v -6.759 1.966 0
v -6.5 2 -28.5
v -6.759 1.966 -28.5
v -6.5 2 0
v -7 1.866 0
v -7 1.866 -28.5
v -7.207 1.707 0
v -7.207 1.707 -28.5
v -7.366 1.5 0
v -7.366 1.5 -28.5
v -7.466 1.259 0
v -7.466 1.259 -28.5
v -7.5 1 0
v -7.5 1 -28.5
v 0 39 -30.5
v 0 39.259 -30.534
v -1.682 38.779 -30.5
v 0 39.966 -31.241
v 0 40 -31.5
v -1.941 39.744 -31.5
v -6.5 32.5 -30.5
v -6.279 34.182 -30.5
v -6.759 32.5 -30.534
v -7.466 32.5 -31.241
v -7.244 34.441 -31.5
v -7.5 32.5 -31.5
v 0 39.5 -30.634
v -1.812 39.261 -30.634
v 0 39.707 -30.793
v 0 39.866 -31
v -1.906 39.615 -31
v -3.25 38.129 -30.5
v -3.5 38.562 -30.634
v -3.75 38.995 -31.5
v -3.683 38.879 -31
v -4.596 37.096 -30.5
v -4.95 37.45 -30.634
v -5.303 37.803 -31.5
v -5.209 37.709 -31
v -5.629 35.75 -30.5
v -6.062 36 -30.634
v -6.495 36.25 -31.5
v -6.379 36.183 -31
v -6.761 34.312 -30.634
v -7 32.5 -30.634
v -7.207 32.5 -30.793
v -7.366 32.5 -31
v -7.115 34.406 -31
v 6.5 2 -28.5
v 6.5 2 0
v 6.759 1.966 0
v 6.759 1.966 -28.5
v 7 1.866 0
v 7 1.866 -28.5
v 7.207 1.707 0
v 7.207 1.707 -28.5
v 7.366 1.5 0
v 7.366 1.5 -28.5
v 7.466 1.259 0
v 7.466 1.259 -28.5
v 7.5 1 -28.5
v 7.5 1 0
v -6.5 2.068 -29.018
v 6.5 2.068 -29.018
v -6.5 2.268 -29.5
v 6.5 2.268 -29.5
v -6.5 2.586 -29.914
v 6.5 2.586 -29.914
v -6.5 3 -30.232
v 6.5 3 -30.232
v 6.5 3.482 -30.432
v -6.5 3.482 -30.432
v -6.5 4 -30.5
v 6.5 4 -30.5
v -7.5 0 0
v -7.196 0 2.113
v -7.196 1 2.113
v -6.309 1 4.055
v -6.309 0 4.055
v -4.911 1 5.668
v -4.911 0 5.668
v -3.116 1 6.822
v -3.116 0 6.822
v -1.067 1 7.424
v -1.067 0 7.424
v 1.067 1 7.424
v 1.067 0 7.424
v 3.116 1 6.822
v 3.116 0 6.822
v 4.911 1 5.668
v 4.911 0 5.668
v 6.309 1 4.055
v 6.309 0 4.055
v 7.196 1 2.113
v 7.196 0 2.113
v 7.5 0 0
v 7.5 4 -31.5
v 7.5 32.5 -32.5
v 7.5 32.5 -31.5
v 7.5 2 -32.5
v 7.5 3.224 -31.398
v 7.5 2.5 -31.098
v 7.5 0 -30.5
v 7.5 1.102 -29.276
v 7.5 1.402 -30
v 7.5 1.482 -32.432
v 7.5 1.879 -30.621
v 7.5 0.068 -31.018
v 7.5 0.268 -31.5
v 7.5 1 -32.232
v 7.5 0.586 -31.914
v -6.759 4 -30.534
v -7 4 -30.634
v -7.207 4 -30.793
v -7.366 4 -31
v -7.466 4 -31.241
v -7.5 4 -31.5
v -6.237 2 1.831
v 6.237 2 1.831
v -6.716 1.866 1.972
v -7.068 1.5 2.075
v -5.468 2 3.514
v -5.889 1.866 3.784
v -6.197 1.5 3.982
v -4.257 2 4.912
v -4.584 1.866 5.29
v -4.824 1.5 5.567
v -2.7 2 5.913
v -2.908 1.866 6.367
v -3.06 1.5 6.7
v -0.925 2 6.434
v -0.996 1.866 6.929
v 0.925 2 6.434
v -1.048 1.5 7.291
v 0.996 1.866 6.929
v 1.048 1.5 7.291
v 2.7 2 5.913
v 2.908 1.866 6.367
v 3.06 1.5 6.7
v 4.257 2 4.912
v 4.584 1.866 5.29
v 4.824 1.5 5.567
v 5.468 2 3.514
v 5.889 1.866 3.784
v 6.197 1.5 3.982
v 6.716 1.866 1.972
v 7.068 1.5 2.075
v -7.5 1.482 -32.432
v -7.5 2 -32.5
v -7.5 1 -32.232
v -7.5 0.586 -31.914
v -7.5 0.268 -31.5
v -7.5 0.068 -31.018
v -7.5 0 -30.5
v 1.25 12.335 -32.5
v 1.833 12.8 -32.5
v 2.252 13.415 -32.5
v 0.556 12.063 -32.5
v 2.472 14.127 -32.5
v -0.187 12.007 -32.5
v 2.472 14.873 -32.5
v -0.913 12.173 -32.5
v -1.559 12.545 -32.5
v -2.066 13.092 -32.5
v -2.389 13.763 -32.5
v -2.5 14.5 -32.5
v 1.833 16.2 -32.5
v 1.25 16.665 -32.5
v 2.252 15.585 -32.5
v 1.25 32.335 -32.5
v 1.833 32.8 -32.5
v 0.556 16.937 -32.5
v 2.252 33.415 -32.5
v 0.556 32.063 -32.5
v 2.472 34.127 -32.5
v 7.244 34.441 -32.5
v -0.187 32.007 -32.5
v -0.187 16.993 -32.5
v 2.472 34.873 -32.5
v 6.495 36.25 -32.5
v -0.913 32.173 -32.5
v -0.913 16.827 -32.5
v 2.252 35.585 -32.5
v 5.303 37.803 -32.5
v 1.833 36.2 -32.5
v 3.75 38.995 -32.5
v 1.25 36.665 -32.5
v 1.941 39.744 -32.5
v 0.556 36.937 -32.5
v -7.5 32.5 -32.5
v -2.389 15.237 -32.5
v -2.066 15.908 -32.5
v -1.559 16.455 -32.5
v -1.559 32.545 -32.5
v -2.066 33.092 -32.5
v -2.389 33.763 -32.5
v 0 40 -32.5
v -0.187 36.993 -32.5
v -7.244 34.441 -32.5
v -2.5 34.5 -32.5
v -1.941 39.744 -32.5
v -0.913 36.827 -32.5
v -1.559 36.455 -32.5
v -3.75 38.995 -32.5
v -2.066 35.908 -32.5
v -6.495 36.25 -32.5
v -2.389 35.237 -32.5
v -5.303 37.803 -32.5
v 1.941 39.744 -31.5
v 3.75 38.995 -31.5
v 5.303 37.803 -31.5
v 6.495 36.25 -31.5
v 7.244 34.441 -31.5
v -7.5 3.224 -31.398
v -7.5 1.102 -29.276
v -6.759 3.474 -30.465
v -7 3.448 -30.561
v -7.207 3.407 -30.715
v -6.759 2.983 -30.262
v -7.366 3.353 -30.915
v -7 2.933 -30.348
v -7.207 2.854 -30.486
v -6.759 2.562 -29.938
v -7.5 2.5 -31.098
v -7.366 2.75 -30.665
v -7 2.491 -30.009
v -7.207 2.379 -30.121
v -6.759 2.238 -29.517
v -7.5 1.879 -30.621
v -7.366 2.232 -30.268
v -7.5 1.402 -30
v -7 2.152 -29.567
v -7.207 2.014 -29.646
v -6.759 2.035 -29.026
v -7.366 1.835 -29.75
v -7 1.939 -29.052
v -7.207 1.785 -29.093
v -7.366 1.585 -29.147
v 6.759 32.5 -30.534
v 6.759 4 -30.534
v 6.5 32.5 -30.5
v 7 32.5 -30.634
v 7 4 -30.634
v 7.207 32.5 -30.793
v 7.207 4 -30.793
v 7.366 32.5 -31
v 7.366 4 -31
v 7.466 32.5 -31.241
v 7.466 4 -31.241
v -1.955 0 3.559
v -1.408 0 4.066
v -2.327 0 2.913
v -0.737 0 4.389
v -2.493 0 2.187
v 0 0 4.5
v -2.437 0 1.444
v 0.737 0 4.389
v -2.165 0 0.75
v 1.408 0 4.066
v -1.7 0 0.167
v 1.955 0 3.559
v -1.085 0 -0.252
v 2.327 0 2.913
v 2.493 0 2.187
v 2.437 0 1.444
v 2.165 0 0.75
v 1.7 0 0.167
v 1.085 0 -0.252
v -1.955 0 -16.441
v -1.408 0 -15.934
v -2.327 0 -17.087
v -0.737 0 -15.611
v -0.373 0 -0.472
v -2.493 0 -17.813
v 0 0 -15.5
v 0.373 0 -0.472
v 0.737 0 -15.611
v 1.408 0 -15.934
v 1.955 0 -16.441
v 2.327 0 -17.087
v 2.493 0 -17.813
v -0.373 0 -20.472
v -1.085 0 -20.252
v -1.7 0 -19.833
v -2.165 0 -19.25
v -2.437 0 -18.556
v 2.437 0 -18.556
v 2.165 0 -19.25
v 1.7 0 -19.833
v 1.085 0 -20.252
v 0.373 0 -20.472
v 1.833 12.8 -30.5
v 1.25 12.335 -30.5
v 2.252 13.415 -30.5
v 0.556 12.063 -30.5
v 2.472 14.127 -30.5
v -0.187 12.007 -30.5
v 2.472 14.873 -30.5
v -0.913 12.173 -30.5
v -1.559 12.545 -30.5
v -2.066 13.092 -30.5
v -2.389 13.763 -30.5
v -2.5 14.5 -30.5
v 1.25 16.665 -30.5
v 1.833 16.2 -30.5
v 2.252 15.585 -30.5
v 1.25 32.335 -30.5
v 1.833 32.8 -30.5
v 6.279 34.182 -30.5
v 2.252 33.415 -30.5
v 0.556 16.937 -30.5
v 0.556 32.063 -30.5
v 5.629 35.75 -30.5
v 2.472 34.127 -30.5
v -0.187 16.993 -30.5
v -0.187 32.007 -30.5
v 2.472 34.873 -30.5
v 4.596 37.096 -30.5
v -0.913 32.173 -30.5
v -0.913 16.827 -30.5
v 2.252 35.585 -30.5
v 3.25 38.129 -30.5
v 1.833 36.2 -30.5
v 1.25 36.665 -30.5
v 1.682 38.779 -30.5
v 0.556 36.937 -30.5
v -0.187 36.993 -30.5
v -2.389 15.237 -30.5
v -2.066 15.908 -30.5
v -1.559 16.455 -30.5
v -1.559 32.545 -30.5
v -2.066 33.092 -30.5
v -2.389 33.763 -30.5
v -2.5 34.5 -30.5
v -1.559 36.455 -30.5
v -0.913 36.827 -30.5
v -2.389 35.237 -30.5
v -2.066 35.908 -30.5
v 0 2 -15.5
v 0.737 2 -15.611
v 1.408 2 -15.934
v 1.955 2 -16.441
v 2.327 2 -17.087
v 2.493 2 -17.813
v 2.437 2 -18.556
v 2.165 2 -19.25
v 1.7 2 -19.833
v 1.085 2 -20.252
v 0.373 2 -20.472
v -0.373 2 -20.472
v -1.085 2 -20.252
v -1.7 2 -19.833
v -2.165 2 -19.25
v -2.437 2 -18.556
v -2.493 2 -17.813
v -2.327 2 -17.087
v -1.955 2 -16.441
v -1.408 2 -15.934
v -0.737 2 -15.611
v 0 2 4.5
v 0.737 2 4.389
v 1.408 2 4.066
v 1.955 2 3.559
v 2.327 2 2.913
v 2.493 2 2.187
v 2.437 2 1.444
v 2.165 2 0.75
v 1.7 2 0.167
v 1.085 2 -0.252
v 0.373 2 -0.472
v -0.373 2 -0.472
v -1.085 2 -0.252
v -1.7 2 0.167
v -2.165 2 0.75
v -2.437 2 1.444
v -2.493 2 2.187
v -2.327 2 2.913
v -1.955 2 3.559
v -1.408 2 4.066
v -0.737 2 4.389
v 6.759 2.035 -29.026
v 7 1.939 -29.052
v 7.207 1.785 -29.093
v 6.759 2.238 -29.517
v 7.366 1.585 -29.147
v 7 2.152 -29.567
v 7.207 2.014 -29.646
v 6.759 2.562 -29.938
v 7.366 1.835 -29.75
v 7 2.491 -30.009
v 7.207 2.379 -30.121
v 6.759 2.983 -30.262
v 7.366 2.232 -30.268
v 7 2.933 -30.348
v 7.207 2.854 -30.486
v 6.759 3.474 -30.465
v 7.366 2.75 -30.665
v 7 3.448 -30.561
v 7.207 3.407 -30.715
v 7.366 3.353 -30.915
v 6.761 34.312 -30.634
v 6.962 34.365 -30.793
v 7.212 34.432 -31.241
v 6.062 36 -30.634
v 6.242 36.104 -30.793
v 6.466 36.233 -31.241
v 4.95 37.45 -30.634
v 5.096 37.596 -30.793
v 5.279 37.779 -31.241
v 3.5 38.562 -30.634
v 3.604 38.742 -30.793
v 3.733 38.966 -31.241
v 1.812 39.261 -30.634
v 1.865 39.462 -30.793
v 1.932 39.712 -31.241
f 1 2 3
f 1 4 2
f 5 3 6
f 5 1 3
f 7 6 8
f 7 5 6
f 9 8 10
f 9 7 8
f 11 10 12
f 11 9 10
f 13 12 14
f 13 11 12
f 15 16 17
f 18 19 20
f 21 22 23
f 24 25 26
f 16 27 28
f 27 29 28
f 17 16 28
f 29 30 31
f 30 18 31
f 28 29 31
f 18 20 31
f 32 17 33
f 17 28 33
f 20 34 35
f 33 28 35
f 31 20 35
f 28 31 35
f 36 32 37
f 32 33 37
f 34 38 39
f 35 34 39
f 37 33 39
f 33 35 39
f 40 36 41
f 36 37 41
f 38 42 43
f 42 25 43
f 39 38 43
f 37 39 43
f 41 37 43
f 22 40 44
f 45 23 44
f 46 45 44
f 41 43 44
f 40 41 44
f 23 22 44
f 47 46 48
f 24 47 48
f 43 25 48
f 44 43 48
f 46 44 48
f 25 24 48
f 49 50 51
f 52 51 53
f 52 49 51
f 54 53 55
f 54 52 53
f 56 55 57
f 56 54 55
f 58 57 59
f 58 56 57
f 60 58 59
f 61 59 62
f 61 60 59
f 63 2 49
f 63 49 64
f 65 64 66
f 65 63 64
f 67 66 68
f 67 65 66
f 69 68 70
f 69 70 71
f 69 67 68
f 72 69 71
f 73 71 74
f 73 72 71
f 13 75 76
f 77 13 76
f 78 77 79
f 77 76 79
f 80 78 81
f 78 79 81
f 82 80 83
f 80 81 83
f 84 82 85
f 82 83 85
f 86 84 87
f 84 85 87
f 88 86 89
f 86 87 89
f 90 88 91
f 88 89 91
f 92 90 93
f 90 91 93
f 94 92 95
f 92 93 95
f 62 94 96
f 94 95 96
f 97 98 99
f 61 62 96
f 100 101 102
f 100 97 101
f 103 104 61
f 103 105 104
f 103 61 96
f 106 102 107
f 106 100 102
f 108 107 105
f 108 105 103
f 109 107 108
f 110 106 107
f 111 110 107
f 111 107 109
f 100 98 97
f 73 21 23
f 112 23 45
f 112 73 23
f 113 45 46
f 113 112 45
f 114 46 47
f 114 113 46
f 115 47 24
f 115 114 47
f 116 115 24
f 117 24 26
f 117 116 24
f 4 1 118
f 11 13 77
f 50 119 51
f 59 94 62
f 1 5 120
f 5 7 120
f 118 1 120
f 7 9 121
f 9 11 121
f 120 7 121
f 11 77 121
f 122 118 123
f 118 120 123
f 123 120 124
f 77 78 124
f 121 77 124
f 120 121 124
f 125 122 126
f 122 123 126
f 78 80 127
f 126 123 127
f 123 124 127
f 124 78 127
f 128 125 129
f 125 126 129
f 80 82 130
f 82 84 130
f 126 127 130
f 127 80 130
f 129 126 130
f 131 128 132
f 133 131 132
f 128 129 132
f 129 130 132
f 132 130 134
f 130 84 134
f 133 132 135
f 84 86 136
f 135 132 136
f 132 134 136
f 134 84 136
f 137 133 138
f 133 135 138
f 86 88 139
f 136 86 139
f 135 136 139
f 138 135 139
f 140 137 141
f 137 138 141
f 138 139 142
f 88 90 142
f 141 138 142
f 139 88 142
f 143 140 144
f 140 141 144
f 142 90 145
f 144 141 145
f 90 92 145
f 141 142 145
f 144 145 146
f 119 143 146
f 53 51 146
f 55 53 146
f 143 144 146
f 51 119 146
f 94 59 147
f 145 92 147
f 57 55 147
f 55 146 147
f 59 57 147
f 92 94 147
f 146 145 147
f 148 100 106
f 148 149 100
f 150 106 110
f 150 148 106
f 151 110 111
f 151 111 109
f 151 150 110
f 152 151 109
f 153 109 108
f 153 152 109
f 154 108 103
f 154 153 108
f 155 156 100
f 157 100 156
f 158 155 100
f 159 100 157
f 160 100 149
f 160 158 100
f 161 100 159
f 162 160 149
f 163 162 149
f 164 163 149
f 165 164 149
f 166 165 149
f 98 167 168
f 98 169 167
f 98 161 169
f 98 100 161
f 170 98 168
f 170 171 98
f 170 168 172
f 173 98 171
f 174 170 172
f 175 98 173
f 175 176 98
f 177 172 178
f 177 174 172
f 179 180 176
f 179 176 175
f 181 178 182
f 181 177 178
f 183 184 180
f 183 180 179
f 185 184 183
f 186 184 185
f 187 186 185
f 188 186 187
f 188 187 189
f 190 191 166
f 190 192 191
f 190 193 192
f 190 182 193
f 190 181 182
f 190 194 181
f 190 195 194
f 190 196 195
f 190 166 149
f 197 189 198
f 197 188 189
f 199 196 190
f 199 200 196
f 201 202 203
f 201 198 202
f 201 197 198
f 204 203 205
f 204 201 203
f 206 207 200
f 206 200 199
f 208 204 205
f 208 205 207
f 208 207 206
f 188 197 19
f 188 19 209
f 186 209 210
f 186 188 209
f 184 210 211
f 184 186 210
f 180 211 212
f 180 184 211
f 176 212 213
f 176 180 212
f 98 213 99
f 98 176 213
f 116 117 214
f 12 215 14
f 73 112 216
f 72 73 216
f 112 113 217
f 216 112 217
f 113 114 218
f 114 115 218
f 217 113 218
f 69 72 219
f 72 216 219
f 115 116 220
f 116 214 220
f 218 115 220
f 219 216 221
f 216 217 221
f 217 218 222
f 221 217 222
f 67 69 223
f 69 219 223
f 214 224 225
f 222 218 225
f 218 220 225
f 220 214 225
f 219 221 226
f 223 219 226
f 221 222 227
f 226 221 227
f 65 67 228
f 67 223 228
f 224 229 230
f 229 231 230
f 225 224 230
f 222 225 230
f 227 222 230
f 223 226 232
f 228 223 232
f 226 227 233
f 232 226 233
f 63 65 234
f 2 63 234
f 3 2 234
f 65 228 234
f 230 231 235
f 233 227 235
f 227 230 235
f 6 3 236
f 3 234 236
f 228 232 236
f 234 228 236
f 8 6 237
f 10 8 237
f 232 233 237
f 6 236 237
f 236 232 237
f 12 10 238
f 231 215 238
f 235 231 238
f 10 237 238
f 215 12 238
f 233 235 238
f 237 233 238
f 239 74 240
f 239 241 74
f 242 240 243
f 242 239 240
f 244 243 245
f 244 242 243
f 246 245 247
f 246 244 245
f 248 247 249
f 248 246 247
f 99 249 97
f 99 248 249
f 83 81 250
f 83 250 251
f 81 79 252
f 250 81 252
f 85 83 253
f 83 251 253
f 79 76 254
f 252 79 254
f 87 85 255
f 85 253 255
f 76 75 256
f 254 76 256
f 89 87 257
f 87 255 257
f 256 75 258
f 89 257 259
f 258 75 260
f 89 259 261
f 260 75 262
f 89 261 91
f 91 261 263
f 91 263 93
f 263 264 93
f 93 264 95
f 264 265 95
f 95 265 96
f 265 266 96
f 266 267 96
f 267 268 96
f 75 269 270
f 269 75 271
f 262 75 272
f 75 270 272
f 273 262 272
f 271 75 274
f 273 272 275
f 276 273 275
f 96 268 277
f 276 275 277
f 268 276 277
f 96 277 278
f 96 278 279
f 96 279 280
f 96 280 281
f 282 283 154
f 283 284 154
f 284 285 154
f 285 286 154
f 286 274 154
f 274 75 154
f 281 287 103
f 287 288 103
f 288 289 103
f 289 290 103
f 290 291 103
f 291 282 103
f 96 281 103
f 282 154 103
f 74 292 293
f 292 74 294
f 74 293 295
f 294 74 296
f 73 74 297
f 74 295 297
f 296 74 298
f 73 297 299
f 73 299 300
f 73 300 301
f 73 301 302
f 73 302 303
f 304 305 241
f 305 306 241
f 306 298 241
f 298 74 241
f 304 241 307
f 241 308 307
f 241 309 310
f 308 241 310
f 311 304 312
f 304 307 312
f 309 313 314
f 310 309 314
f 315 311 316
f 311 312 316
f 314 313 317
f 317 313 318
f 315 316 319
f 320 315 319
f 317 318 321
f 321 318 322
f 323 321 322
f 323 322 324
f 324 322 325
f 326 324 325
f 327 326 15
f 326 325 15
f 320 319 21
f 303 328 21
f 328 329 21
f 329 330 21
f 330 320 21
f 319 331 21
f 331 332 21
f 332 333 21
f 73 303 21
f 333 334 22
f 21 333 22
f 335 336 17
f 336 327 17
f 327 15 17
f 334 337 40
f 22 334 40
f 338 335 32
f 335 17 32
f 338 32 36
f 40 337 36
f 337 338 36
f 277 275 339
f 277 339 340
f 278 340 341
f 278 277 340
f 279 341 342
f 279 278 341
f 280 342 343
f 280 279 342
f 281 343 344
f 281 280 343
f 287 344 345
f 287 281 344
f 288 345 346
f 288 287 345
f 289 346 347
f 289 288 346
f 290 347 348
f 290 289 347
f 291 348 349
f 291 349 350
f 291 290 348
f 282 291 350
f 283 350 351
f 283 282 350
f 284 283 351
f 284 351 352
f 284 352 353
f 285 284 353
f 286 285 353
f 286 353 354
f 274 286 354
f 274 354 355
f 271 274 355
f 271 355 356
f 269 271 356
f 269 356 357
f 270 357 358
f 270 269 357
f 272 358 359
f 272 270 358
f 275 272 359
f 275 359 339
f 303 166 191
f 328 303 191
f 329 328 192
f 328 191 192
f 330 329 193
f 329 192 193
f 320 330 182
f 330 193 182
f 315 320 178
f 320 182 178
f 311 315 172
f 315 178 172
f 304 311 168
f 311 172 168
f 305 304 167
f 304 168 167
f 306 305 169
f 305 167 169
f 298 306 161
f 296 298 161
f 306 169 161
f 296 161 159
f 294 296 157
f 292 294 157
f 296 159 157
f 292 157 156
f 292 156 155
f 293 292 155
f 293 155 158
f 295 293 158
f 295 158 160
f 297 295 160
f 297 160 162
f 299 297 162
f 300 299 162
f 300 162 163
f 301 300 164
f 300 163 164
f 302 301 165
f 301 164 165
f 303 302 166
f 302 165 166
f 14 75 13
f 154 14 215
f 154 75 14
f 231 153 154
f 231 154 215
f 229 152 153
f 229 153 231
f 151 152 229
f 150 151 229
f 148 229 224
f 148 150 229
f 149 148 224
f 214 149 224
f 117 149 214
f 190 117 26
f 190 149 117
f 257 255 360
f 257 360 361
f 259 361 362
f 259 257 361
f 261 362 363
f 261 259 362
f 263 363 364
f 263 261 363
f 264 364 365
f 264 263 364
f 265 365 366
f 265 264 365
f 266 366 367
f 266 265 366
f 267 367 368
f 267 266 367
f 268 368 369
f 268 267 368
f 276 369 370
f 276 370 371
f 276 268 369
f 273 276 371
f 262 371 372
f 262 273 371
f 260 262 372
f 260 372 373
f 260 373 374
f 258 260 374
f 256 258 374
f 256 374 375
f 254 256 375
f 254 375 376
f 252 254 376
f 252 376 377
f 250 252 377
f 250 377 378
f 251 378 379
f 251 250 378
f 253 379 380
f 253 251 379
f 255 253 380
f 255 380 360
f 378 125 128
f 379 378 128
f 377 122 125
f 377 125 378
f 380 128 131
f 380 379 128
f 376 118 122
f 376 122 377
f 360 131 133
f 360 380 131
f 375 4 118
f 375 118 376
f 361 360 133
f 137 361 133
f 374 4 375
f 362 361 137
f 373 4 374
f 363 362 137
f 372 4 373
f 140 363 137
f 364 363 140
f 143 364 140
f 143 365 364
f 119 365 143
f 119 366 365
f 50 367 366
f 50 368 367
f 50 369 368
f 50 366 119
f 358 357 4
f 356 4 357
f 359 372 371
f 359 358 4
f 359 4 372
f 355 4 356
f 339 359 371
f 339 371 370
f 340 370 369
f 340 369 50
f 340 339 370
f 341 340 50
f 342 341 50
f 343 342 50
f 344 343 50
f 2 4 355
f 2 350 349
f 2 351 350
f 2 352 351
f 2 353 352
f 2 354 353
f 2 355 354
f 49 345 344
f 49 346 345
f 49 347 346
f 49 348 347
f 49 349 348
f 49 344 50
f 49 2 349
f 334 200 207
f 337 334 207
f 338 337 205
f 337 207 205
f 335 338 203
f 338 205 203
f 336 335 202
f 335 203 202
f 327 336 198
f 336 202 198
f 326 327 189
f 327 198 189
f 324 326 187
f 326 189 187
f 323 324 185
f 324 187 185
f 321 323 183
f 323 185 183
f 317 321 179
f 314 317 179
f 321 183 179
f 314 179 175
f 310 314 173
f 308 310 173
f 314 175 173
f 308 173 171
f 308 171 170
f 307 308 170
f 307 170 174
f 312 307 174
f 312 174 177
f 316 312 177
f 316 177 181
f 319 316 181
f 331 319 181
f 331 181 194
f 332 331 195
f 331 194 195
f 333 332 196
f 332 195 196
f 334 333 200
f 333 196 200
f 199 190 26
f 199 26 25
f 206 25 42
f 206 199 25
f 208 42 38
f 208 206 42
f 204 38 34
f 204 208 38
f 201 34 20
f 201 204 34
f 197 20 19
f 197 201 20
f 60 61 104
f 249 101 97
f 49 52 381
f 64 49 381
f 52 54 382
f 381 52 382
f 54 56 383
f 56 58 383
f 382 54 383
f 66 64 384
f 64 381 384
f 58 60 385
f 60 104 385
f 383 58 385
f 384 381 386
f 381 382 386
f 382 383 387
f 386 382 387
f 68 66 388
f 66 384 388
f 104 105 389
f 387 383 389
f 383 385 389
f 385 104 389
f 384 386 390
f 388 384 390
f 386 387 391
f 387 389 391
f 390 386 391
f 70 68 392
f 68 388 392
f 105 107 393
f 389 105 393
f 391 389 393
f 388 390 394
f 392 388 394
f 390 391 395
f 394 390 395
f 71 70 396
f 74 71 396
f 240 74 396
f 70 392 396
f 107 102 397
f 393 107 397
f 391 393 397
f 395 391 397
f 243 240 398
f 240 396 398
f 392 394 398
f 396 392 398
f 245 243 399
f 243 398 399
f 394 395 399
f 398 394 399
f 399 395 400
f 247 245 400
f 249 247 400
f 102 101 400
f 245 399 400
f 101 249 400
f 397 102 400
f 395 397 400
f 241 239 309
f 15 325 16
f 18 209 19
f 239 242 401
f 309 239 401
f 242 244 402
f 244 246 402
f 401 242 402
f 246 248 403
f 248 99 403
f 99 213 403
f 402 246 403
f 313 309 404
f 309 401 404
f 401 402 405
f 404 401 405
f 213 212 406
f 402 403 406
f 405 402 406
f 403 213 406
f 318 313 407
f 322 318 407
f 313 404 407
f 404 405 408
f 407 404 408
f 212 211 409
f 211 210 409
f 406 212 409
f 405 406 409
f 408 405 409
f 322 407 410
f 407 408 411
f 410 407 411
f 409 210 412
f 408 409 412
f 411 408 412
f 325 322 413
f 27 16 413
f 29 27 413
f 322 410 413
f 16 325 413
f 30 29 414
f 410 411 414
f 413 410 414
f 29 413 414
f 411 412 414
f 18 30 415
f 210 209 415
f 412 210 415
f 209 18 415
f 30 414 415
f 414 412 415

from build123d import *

# Parameters (mm, degrees)
ESQUISSE1_R        = 2.5
BOSS_EXTRU_2_DEPTH = 2
ESQUISSE2_R        = 2.5
ESQUISSE2_W        = 15
ESQUISSE2_H        = 2
BOSS_EXTRU_3_DEPTH = 2
CONG_1_R           = 2
CONG_2_R           = 2
CONG_4_R           = 1


with BuildPart() as part:
    # Esquisse1 → Boss.-Extru.2 (new body)
    with BuildSketch(Plane(origin=(0, 0, 0), x_dir=(1, 0, 0), z_dir=(0, 1, 0))):
        with BuildLine():
            ThreePointArc((-7.5, 0), (0, -7.5), (7.5, 0))
            Line((7.5, 0), (7.5, 32.5))
            Line((7.5, 32.5), (-7.5, 32.5))
            Line((-7.5, 32.5), (-7.5, 0))
        make_face()
        with Locations(Location((0, -2, 0), (0, 0, 270))):
            Circle(ESQUISSE1_R, mode=Mode.SUBTRACT)
        with Locations(Location((0, 18, 0), (0, 0, 270))):
            Circle(ESQUISSE1_R, mode=Mode.SUBTRACT)
    extrude(amount=BOSS_EXTRU_2_DEPTH)

    # Esquisse2 → Boss.-Extru.3 (add)
    # profile 1 of 2: a face of its own
    with BuildSketch(Plane(origin=(0, 0, -32.5), x_dir=(-1, 0, 0), z_dir=(0, 0, -1))):
        with BuildLine():
            Line((-7.5, 32.5), (-7.5, 2))
            Line((-7.5, 2), (7.5, 2))
            Line((7.5, 2), (7.5, 32.5))
            ThreePointArc((7.5, 32.5), (5.303300859, 37.803300859), (0, 40))
            ThreePointArc((0, 40), (-5.303300859, 37.803300859), (-7.5, 32.5))
        make_face()
        with Locations((0, 14.5)):
            Circle(ESQUISSE2_R, mode=Mode.SUBTRACT)
        with Locations((0, 34.5)):
            Circle(ESQUISSE2_R, mode=Mode.SUBTRACT)
    # profile 2 of 2: a face of its own
    with BuildSketch(Plane(origin=(0, 0, -32.5), x_dir=(-1, 0, 0), z_dir=(0, 0, -1))):
        with Locations((0, 1)):
            Rectangle(ESQUISSE2_W, ESQUISSE2_H)
    extrude(amount=-BOSS_EXTRU_3_DEPTH)

    # Congé1
    cong_1_edges = [part.edges().sort_by_distance(p)[0] for p in [
        (0, 0, -32.5),
    ]]
    fillet(cong_1_edges, radius=CONG_1_R)

    # Congé2
    cong_2_edges = [part.edges().sort_by_distance(p)[0] for p in [
        (0, 2, -30.5),
    ]]
    fillet(cong_2_edges, radius=CONG_2_R)

    # Congé4
    cong_4_edges = [part.edges().sort_by_distance(p)[0] for p in [
        (0, 2, 7.5),
        (7.5, 2, -14.25),
        (0, 40, -30.5),
        (-7.5, 2, -14.25),
        (7.5, 18.25, -30.5),
        (-7.5, 18.25, -30.5),
        (-7.5, 2.585786438, -29.914213562),
        (7.5, 2.585786438, -29.914213562),
    ]]
    fillet(cong_4_edges, radius=CONG_4_R)


solid = part.part
